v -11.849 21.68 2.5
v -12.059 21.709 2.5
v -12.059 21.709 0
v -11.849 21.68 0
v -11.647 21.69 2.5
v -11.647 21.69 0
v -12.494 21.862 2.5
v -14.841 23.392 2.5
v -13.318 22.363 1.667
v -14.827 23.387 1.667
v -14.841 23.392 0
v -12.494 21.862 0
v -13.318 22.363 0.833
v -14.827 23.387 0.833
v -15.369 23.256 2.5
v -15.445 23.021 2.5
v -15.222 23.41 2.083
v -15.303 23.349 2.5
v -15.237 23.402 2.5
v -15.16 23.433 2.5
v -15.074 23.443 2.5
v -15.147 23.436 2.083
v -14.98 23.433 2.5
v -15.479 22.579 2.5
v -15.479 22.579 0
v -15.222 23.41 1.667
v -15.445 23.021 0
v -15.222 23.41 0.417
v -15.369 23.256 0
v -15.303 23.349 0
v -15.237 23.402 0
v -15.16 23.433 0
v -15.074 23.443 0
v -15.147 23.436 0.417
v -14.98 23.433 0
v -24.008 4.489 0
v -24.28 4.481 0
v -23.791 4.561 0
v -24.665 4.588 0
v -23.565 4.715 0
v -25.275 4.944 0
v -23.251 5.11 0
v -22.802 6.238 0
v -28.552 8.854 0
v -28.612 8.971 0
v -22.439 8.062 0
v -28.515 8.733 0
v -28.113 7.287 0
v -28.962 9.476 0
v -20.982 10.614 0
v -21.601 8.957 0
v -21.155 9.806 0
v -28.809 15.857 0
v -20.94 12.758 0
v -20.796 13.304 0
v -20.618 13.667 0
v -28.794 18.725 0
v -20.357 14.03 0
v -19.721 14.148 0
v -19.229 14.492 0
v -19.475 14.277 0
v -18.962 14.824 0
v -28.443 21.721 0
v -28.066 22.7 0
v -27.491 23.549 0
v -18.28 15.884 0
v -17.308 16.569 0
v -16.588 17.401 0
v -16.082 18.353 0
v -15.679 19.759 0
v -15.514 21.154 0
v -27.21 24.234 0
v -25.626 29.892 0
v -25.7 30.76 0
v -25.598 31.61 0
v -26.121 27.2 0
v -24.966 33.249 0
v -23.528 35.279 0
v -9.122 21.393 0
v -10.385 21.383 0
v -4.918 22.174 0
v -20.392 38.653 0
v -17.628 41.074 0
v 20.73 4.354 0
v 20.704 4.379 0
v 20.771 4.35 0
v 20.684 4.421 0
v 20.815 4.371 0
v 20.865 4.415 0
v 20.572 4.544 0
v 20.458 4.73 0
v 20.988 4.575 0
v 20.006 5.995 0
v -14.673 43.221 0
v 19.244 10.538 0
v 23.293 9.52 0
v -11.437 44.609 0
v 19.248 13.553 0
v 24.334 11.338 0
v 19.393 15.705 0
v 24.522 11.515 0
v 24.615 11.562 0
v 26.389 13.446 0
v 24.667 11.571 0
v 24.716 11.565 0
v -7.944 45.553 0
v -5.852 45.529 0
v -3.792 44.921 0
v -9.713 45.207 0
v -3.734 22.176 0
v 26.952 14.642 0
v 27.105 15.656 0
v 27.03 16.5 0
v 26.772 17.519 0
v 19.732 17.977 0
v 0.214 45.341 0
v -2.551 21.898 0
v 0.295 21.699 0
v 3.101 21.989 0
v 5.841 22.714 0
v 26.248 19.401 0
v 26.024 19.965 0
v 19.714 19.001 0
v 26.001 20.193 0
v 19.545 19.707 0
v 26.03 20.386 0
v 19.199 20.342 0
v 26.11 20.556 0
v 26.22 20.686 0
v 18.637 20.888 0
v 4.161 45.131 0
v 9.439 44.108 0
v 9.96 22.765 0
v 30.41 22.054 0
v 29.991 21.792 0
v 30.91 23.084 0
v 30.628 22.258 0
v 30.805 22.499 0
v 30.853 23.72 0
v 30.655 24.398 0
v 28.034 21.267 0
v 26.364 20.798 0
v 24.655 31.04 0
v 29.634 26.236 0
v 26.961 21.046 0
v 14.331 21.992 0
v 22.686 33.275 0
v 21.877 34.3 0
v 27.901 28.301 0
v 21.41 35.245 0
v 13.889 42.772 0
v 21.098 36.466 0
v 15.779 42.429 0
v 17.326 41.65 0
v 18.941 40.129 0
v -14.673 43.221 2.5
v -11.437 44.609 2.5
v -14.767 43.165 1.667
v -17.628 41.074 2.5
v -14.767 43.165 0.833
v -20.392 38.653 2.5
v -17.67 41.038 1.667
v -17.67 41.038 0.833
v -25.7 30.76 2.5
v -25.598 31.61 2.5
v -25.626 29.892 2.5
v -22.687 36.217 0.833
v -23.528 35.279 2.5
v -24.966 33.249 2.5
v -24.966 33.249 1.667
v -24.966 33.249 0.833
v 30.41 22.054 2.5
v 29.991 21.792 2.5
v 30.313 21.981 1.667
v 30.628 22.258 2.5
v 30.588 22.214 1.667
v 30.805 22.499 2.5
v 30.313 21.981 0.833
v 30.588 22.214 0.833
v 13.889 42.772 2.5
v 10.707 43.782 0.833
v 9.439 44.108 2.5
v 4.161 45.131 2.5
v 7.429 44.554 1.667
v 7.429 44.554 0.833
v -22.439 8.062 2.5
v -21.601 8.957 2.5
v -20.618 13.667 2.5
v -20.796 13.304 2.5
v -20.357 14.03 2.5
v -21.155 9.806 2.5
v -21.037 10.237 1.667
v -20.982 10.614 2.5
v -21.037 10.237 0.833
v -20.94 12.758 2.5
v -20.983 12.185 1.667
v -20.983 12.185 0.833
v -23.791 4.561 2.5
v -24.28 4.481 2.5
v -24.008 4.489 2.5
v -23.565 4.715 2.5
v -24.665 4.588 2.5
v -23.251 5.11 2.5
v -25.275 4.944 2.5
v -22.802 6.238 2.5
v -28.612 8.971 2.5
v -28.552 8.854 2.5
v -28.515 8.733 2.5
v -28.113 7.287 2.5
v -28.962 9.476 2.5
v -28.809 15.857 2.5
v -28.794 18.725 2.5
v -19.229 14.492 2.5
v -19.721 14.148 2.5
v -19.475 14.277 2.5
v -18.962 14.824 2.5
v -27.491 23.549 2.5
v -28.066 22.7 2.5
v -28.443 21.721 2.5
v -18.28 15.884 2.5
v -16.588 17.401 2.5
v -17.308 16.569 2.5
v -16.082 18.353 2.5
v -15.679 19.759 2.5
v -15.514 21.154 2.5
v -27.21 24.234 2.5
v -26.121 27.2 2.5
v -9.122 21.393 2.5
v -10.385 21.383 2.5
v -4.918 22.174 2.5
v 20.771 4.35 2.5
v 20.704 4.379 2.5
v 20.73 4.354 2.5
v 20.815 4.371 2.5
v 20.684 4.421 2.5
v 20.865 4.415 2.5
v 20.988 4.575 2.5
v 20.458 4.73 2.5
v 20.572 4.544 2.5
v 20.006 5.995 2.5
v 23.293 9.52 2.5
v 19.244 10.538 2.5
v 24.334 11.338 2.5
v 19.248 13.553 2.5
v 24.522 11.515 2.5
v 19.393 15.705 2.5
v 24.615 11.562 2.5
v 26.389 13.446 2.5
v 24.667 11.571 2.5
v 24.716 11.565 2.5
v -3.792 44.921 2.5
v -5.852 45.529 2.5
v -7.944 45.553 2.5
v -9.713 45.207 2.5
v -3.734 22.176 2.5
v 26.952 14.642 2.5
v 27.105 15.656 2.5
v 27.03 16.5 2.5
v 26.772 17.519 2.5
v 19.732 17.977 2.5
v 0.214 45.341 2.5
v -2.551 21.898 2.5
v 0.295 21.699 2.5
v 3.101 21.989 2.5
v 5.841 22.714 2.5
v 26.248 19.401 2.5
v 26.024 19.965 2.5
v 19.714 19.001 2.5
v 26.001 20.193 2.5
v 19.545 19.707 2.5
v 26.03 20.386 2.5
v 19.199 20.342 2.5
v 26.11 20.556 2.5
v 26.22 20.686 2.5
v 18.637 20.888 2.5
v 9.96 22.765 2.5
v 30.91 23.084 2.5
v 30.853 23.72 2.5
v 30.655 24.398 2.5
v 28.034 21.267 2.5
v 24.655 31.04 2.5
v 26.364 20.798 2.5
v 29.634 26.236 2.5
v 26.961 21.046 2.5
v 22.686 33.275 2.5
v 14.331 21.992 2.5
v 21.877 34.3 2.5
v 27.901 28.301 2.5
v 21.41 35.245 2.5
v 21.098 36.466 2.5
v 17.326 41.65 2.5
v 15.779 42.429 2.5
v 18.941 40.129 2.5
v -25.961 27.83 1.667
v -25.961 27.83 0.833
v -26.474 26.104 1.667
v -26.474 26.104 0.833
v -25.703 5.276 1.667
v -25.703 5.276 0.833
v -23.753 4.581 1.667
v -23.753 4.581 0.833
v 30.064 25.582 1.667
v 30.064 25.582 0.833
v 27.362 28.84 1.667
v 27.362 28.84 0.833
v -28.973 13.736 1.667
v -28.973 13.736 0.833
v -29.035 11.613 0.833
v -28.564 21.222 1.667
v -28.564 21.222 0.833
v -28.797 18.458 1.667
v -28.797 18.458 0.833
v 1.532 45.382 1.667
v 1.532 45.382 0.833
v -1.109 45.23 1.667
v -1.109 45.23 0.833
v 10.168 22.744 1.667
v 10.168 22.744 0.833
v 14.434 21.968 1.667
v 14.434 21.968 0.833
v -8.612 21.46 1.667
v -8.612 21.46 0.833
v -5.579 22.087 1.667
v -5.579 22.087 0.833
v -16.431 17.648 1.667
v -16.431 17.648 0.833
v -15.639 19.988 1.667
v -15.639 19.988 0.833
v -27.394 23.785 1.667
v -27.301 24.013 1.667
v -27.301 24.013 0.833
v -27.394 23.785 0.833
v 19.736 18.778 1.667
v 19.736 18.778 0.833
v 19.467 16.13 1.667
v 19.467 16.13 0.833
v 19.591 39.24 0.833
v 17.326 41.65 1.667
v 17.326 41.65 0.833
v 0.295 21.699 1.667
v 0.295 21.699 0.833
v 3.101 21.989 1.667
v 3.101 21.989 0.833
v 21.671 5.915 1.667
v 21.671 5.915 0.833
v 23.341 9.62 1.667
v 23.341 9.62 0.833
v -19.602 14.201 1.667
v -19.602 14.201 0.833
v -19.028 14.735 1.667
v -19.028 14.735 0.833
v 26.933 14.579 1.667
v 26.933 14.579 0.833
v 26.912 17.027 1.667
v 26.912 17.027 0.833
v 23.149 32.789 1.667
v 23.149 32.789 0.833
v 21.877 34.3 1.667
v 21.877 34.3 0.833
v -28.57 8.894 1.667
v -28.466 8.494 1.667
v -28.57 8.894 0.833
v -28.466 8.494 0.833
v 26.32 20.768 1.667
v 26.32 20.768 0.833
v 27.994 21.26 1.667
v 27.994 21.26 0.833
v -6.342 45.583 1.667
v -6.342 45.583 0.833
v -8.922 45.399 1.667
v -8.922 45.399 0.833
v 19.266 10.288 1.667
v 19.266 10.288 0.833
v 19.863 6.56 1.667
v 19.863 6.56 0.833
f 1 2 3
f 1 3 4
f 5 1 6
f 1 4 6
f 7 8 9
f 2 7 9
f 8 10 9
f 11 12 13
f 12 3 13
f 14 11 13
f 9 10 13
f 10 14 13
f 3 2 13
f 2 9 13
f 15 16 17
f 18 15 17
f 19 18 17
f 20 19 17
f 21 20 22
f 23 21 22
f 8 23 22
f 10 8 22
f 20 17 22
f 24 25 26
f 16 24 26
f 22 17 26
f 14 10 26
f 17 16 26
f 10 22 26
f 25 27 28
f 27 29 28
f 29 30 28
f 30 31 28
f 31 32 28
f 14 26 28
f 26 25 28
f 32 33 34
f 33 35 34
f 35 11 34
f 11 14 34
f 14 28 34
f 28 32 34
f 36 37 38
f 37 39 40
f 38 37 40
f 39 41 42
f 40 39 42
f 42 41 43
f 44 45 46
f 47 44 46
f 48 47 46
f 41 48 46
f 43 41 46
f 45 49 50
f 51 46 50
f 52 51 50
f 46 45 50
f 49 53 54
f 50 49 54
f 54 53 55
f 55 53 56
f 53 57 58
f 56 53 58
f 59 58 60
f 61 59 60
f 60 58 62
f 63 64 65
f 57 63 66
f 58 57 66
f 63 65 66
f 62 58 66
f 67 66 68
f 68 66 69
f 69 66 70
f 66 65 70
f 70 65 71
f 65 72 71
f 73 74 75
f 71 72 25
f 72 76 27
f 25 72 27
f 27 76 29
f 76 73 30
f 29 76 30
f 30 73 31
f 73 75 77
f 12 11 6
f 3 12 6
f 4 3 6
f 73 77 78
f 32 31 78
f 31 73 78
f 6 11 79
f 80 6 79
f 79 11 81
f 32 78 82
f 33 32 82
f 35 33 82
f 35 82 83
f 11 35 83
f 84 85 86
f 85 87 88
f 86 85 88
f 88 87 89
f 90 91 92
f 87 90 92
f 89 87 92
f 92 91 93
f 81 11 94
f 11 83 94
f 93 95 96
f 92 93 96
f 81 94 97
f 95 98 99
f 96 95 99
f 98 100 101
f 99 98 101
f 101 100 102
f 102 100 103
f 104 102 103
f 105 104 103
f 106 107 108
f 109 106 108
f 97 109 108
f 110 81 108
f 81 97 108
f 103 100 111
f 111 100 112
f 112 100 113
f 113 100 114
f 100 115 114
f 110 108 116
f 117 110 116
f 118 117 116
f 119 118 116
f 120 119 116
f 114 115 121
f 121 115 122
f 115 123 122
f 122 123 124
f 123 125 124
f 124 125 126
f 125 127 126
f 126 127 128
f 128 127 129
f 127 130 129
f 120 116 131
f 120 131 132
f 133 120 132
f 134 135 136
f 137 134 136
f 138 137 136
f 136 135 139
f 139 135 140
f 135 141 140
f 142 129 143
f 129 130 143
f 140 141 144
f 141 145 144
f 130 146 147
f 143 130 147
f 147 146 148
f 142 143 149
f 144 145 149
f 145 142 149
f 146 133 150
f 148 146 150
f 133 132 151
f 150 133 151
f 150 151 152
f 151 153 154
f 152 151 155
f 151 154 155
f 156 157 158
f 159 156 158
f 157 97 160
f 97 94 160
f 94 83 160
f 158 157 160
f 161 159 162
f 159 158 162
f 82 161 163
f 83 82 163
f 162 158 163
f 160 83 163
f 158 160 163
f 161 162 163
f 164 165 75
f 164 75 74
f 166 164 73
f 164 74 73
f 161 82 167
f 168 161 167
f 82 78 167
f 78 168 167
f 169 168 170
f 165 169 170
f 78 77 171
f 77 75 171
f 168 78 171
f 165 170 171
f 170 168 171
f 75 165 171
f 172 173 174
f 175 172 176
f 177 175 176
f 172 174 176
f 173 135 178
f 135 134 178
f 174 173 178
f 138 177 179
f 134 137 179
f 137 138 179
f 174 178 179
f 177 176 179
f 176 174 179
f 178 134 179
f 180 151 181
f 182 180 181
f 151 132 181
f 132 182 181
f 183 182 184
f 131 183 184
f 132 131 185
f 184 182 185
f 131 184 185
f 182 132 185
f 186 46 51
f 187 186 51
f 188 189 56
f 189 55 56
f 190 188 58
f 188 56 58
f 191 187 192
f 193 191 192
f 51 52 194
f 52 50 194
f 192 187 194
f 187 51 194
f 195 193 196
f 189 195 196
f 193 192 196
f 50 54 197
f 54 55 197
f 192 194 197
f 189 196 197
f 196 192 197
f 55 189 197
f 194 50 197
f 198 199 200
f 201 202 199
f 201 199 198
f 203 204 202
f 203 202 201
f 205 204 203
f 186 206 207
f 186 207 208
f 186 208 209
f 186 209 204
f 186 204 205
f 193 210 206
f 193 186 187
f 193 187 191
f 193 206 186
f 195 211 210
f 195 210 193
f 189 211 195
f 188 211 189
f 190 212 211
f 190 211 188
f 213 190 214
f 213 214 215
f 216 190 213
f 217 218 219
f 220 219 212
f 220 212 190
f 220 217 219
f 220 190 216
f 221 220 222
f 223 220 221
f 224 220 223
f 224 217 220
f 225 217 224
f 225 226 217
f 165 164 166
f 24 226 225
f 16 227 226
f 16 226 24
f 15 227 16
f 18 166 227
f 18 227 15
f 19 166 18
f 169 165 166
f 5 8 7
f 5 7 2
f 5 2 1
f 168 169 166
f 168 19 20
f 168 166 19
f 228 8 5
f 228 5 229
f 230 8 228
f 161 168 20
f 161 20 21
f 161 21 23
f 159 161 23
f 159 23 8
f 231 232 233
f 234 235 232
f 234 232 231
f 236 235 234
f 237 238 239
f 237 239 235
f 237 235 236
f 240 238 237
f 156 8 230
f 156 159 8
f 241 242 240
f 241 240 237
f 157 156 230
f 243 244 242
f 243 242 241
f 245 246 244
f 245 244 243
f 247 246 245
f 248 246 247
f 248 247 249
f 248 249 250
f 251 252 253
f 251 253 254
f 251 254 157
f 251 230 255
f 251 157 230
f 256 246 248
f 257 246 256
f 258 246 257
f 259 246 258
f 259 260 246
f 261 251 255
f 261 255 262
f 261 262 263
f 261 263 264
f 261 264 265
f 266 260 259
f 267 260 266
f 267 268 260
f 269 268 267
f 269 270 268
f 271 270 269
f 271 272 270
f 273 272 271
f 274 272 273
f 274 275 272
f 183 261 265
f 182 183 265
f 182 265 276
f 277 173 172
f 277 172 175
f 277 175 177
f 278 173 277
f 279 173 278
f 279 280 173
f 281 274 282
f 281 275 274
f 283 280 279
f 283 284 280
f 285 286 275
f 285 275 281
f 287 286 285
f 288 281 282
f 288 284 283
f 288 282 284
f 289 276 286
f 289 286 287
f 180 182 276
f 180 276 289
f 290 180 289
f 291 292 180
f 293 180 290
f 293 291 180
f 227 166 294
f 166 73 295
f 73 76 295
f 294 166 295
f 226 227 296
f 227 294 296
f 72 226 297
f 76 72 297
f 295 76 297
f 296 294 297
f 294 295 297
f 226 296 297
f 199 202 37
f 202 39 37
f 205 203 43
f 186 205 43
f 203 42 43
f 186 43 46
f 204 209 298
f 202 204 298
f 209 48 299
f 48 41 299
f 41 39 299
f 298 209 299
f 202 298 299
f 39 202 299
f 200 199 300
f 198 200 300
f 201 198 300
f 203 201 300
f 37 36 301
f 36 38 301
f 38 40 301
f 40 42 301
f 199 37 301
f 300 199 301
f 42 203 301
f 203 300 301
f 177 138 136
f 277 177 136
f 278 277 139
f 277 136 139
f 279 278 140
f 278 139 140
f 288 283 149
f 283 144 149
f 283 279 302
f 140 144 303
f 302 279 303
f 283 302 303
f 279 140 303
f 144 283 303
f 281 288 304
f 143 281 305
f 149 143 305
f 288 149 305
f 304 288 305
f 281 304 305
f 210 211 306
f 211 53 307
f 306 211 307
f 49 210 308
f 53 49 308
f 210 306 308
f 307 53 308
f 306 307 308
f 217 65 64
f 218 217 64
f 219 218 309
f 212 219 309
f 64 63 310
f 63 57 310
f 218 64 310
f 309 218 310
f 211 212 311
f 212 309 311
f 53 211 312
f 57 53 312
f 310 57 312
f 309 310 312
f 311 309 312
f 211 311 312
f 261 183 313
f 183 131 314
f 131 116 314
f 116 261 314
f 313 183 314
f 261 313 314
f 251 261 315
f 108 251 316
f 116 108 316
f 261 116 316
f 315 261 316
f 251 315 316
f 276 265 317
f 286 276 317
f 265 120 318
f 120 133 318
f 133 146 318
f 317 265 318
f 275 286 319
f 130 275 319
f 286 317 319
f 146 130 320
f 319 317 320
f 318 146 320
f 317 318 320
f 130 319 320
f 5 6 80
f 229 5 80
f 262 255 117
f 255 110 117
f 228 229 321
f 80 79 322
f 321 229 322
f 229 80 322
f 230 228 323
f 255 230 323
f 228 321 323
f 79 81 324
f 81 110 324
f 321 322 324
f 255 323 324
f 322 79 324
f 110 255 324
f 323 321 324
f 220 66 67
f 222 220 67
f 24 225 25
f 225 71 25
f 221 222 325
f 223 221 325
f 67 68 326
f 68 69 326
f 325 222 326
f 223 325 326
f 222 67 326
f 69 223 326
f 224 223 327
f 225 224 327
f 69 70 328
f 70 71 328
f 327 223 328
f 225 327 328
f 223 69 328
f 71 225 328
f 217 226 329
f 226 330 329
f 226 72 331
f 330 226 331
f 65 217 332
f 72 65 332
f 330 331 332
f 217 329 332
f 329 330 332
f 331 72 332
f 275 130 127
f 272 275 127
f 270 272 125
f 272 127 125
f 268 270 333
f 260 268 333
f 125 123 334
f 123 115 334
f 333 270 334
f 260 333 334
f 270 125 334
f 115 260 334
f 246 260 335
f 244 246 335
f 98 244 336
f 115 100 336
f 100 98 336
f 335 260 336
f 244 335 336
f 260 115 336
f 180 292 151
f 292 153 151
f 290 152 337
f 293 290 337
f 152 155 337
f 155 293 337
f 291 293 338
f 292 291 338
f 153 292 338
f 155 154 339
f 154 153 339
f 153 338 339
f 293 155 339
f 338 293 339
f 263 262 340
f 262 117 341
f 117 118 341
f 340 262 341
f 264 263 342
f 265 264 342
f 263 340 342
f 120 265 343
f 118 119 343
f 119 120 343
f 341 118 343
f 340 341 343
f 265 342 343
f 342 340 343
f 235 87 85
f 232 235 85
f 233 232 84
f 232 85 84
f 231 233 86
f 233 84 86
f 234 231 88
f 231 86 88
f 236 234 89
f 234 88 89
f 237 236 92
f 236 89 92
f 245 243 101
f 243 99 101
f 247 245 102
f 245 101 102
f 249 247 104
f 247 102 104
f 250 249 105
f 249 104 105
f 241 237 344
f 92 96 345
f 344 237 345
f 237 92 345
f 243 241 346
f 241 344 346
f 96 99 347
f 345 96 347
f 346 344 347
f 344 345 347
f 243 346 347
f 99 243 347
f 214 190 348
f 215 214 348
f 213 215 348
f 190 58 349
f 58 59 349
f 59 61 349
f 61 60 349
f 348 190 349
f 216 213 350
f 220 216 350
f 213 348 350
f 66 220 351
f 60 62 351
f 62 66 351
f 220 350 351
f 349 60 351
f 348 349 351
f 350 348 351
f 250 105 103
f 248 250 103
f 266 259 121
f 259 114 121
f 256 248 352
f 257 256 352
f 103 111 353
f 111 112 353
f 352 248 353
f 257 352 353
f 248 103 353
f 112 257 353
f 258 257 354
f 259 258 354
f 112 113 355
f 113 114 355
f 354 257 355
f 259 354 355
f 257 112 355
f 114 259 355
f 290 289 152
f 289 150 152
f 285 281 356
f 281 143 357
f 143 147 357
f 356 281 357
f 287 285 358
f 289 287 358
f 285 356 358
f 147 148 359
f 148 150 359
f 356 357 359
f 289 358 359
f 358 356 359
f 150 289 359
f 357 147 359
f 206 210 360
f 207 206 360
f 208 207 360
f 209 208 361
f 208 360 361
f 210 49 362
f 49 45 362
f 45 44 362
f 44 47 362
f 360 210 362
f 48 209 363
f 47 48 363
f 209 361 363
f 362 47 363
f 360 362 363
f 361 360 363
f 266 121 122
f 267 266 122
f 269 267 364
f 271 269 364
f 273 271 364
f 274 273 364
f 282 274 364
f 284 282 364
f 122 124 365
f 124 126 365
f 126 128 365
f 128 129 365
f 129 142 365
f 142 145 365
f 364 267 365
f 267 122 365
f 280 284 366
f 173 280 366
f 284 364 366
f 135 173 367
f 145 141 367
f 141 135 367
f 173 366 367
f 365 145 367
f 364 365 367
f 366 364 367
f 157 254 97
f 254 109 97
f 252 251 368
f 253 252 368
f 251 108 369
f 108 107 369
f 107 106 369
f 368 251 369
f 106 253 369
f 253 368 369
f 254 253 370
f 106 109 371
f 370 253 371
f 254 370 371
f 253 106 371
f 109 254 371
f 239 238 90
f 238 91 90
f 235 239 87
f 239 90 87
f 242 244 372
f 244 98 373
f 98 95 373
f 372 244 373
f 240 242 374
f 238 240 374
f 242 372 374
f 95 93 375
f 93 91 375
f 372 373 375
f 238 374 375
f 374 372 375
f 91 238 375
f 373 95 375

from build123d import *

# Parameters (mm, degrees)
F1_DEPTH = 2.5


with BuildPart() as f1:
    # F0 (on Top) → F1 (new body)
    with BuildSketch(Plane.XY):
        with BuildLine():
            add(Edge.make_bspline(
                [(-25.6257737843, 29.8916869719), (-25.8873034064, 27.5028125175), (-26.3476858106, 26.3349166155), (-27.2098956588, 24.2340467342)],
                knots=[0, 0, 0, 0, 0.906224542, 0.906224542, 0.906224542, 0.906224542], degree=3))
            add(Edge.make_bspline(
                [(-27.2098956588, 24.2340467342), (-19.7568631721, 31.0778006363), (-9.9904411425, 34.8972392423), (0.1697760545, 34.8972392423)],
                knots=[0.0536881033, 0.0536881033, 0.0536881033, 0.0536881033, 1, 1, 1, 1], degree=3))
            add(Edge.make_bspline(
                [(0.1697760545, 34.8972392423), (10.9064226016, 34.8972392423), (21.2033250388, 30.6321223941), (28.7952806224, 23.0401668105)],
                knots=[0, 0, 0, 0, 1, 1, 1, 1], degree=3))
            add(Edge.make_bspline(
                [(28.7952806224, 23.0401668105), (29.2036402391, 22.6318071461), (29.6023746478, 22.2156215356), (29.9913378332, 21.7919624913)],
                knots=[0, 0, 0, 0, 0.0537884623, 0.0537884623, 0.0537884623, 0.0537884623], degree=3))
            add(Edge.make_bspline(
                [(29.9913378332, 21.7919624913), (30.3332701533, 21.9612258157), (30.6193747535, 22.1863755662), (30.8054165504, 22.4991043824)],
                knots=[0.8351689985, 0.8351689985, 0.8351689985, 0.8351689985, 1, 1, 1, 1], degree=3))
            add(Edge.make_bspline(
                [(30.8054165504, 22.4991043824), (31.6957144217, 25.0845200026), (26.7139510097, 29.7791972617), (24.6549925526, 31.0400298102)],
                knots=[0, 0, 0, 0, 1, 1, 1, 1], degree=3))
            add(Edge.make_bspline(
                [(24.6549925526, 31.0400298102), (23.1179127612, 33.2059942426), (21.5435347067, 33.6748327354), (21.0984451745, 36.465856937)],
                knots=[0, 0, 0, 0, 1, 1, 1, 1], degree=3))
            add(Edge.make_bspline(
                [(21.0984451745, 36.465856937), (19.8331981529, 39.1149778628), (18.0484592424, 42.6006720177), (13.8889900701, 42.7717326263)],
                knots=[0, 0, 0, 0, 1, 1, 1, 1], degree=3))
            add(Edge.make_bspline(
                [(13.8889900701, 42.7717326263), (10.7894802938, 43.9150731637), (7.3893572276, 44.6367175954), (4.1607868433, 45.1314240668)],
                knots=[0, 0, 0, 0, 1, 1, 1, 1], degree=3))
            add(Edge.make_bspline(
                [(4.1607868433, 45.1314240668), (1.5282767132, 45.665729576), (-1.0791917665, 45.2263791247), (-3.7920543494, 44.9209612497)],
                knots=[0, 0, 0, 0, 1, 1, 1, 1], degree=3))
            add(Edge.make_bspline(
                [(-3.7920543494, 44.9209612497), (-6.2944709608, 46.0858599135), (-8.9868296064, 45.6211947336), (-11.4372380688, 44.6089132422)],
                knots=[0, 0, 0, 0, 1, 1, 1, 1], degree=3))
            add(Edge.make_bspline(
                [(-11.4372380688, 44.6089132422), (-15.0606302684, 43.646353311), (-17.6803792997, 41.0271699422), (-20.3918525515, 38.6530505605)],
                knots=[0, 0, 0, 0, 1, 1, 1, 1], degree=3))
            add(Edge.make_bspline(
                [(-20.3918525515, 38.6530505605), (-22.1616377559, 36.5296296256), (-26.3092164888, 33.3963042234), (-25.6257737843, 29.8916869719)],
                knots=[0, 0, 0, 0, 1, 1, 1, 1], degree=3))
        make_face()
        with BuildLine():
            add(Edge.make_bspline(
                [(-28.1128917952, 7.2867966011), (-25.5327577608, 5.5724959764), (-23.3754139192, 1.5391420658), (-22.4392237926, 8.0616239512)],
                knots=[0, 0, 0, 0, 1, 1, 1, 1], degree=3))
            add(Edge.make_bspline(
                [(-22.4392237926, 8.0616239512), (-19.7232837573, 10.3918867536), (-21.9086846384, 12.1959849769), (-20.3570244073, 14.0296944818)],
                knots=[0, 0, 0, 0, 1, 1, 1, 1], degree=3))
            add(Edge.make_bspline(
                [(-20.3570244073, 14.0296944818), (-19.3927683751, 14.1045889117), (-19.2338961097, 14.3421184154), (-18.2799150982, 15.8843006958)],
                knots=[0, 0, 0, 0, 1, 1, 1, 1], degree=3))
            add(Edge.make_bspline(
                [(-18.2799150982, 15.8843006958), (-15.7612059869, 17.2500228615), (-15.4655923382, 19.9714723435), (-15.4787462089, 22.579406298)],
                knots=[0, 0, 0, 0, 1, 1, 1, 1], degree=3))
            add(Edge.make_bspline(
                [(-15.4787462089, 22.579406298), (-15.4863782201, 25.0304123412), (-13.1685706331, 21.4589405155), (-11.6470474482, 21.6898141749)],
                knots=[0, 0, 0, 0, 1, 1, 1, 1], degree=3))
            add(Edge.make_bspline(
                [(-11.6470474482, 21.6898141749), (-8.6113892696, 20.4740608526), (-5.5748604317, 23.0532887629), (-2.550901183, 21.8980551263)],
                knots=[0, 0, 0, 0, 1, 1, 1, 1], degree=3))
            add(Edge.make_bspline(
                [(-2.550901183, 21.8980551263), (0.3056919961, 21.435862725), (3.1433310469, 21.7901660791), (5.8406263838, 22.7138664122)],
                knots=[0, 0, 0, 0, 1, 1, 1, 1], degree=3))
            add(Edge.make_bspline(
                [(5.8406263838, 22.7138664122), (10.1982476767, 23.3134917592), (14.4656005765, 21.9525661991), (18.6367491731, 20.8882535066)],
                knots=[0, 0, 0, 0, 1, 1, 1, 1], degree=3))
            add(Edge.make_bspline(
                [(18.6367491731, 20.8882535066), (20.8934616591, 19.2509494841), (18.9683426833, 15.8911569159), (19.2480353254, 13.5529438063)],
                knots=[0, 0, 0, 0, 1, 1, 1, 1], degree=3))
            add(Edge.make_bspline(
                [(19.2480353254, 13.5529438063), (18.8583496906, 11.2042269284), (19.8698101733, 5.08143262), (20.6839670293, 4.421158141)],
                knots=[0, 0, 0, 0, 1, 1, 1, 1], degree=3))
            add(Edge.make_bspline(
                [(20.6839670293, 4.421158141), (21.005391913, 3.4844342702), (23.8127236869, 11.82477115), (24.7163704849, 11.5650362883)],
                knots=[0, 0, 0, 0, 1, 1, 1, 1], degree=3))
            add(Edge.make_bspline(
                [(24.7163704849, 11.5650362883), (28.5821872084, 15.0265470396), (26.7026865228, 16.8994273456), (26.2481154934, 19.400803067)],
                knots=[0, 0, 0, 0, 1, 1, 1, 1], degree=3))
            add(Edge.make_bspline(
                [(26.2481154934, 19.400803067), (25.0930725774, 21.5114623664), (28.2588283498, 20.9343357116), (29.9913378332, 21.7919624913)],
                knots=[0, 0, 0, 0, 0.8351689985, 0.8351689985, 0.8351689985, 0.8351689985], degree=3))
            add(Edge.make_bspline(
                [(28.7952806224, 23.0401668105), (29.2036402391, 22.6318071461), (29.6023746478, 22.2156215356), (29.9913378332, 21.7919624913)],
                knots=[0, 0, 0, 0, 0.0537884623, 0.0537884623, 0.0537884623, 0.0537884623], degree=3))
            add(Edge.make_bspline(
                [(0.1697760545, 34.8972392423), (10.9064226016, 34.8972392423), (21.2033250388, 30.6321223941), (28.7952806224, 23.0401668105)],
                knots=[0, 0, 0, 0, 1, 1, 1, 1], degree=3))
            add(Edge.make_bspline(
                [(-27.2098956588, 24.2340467342), (-19.7568631721, 31.0778006363), (-9.9904411425, 34.8972392423), (0.1697760545, 34.8972392423)],
                knots=[0.0536881033, 0.0536881033, 0.0536881033, 0.0536881033, 1, 1, 1, 1], degree=3))
            add(Edge.make_bspline(
                [(-27.2098956588, 24.2340467342), (-27.2991165082, 24.0166502434), (-27.3926401099, 23.7892635044), (-27.4906913704, 23.5494998258)],
                knots=[0.906224542, 0.906224542, 0.906224542, 0.906224542, 1, 1, 1, 1], degree=3))
            add(Edge.make_bspline(
                [(-27.4906913704, 23.5494998258), (-29.1920252009, 21.6413285608), (-28.6991380704, 18.1749981518), (-28.8091487955, 15.8573740948)],
                knots=[0, 0, 0, 0, 1, 1, 1, 1], degree=3))
            add(Edge.make_bspline(
                [(-28.8091487955, 15.8573740948), (-29.0146642819, 13.7320690959), (-29.1121337897, 11.6247296457), (-28.9618643827, 9.4762564212)],
                knots=[0, 0, 0, 0, 1, 1, 1, 1], degree=3))
            add(Edge.make_bspline(
                [(-28.9618643827, 9.4762564212), (-28.2470345, 8.4729980453), (-28.7688120912, 9.2274118933), (-28.1128917952, 7.2867966011)],
                knots=[0, 0, 0, 0, 1, 1, 1, 1], degree=3))
        make_face()
    extrude(amount=F1_DEPTH)


solid = f1.part
